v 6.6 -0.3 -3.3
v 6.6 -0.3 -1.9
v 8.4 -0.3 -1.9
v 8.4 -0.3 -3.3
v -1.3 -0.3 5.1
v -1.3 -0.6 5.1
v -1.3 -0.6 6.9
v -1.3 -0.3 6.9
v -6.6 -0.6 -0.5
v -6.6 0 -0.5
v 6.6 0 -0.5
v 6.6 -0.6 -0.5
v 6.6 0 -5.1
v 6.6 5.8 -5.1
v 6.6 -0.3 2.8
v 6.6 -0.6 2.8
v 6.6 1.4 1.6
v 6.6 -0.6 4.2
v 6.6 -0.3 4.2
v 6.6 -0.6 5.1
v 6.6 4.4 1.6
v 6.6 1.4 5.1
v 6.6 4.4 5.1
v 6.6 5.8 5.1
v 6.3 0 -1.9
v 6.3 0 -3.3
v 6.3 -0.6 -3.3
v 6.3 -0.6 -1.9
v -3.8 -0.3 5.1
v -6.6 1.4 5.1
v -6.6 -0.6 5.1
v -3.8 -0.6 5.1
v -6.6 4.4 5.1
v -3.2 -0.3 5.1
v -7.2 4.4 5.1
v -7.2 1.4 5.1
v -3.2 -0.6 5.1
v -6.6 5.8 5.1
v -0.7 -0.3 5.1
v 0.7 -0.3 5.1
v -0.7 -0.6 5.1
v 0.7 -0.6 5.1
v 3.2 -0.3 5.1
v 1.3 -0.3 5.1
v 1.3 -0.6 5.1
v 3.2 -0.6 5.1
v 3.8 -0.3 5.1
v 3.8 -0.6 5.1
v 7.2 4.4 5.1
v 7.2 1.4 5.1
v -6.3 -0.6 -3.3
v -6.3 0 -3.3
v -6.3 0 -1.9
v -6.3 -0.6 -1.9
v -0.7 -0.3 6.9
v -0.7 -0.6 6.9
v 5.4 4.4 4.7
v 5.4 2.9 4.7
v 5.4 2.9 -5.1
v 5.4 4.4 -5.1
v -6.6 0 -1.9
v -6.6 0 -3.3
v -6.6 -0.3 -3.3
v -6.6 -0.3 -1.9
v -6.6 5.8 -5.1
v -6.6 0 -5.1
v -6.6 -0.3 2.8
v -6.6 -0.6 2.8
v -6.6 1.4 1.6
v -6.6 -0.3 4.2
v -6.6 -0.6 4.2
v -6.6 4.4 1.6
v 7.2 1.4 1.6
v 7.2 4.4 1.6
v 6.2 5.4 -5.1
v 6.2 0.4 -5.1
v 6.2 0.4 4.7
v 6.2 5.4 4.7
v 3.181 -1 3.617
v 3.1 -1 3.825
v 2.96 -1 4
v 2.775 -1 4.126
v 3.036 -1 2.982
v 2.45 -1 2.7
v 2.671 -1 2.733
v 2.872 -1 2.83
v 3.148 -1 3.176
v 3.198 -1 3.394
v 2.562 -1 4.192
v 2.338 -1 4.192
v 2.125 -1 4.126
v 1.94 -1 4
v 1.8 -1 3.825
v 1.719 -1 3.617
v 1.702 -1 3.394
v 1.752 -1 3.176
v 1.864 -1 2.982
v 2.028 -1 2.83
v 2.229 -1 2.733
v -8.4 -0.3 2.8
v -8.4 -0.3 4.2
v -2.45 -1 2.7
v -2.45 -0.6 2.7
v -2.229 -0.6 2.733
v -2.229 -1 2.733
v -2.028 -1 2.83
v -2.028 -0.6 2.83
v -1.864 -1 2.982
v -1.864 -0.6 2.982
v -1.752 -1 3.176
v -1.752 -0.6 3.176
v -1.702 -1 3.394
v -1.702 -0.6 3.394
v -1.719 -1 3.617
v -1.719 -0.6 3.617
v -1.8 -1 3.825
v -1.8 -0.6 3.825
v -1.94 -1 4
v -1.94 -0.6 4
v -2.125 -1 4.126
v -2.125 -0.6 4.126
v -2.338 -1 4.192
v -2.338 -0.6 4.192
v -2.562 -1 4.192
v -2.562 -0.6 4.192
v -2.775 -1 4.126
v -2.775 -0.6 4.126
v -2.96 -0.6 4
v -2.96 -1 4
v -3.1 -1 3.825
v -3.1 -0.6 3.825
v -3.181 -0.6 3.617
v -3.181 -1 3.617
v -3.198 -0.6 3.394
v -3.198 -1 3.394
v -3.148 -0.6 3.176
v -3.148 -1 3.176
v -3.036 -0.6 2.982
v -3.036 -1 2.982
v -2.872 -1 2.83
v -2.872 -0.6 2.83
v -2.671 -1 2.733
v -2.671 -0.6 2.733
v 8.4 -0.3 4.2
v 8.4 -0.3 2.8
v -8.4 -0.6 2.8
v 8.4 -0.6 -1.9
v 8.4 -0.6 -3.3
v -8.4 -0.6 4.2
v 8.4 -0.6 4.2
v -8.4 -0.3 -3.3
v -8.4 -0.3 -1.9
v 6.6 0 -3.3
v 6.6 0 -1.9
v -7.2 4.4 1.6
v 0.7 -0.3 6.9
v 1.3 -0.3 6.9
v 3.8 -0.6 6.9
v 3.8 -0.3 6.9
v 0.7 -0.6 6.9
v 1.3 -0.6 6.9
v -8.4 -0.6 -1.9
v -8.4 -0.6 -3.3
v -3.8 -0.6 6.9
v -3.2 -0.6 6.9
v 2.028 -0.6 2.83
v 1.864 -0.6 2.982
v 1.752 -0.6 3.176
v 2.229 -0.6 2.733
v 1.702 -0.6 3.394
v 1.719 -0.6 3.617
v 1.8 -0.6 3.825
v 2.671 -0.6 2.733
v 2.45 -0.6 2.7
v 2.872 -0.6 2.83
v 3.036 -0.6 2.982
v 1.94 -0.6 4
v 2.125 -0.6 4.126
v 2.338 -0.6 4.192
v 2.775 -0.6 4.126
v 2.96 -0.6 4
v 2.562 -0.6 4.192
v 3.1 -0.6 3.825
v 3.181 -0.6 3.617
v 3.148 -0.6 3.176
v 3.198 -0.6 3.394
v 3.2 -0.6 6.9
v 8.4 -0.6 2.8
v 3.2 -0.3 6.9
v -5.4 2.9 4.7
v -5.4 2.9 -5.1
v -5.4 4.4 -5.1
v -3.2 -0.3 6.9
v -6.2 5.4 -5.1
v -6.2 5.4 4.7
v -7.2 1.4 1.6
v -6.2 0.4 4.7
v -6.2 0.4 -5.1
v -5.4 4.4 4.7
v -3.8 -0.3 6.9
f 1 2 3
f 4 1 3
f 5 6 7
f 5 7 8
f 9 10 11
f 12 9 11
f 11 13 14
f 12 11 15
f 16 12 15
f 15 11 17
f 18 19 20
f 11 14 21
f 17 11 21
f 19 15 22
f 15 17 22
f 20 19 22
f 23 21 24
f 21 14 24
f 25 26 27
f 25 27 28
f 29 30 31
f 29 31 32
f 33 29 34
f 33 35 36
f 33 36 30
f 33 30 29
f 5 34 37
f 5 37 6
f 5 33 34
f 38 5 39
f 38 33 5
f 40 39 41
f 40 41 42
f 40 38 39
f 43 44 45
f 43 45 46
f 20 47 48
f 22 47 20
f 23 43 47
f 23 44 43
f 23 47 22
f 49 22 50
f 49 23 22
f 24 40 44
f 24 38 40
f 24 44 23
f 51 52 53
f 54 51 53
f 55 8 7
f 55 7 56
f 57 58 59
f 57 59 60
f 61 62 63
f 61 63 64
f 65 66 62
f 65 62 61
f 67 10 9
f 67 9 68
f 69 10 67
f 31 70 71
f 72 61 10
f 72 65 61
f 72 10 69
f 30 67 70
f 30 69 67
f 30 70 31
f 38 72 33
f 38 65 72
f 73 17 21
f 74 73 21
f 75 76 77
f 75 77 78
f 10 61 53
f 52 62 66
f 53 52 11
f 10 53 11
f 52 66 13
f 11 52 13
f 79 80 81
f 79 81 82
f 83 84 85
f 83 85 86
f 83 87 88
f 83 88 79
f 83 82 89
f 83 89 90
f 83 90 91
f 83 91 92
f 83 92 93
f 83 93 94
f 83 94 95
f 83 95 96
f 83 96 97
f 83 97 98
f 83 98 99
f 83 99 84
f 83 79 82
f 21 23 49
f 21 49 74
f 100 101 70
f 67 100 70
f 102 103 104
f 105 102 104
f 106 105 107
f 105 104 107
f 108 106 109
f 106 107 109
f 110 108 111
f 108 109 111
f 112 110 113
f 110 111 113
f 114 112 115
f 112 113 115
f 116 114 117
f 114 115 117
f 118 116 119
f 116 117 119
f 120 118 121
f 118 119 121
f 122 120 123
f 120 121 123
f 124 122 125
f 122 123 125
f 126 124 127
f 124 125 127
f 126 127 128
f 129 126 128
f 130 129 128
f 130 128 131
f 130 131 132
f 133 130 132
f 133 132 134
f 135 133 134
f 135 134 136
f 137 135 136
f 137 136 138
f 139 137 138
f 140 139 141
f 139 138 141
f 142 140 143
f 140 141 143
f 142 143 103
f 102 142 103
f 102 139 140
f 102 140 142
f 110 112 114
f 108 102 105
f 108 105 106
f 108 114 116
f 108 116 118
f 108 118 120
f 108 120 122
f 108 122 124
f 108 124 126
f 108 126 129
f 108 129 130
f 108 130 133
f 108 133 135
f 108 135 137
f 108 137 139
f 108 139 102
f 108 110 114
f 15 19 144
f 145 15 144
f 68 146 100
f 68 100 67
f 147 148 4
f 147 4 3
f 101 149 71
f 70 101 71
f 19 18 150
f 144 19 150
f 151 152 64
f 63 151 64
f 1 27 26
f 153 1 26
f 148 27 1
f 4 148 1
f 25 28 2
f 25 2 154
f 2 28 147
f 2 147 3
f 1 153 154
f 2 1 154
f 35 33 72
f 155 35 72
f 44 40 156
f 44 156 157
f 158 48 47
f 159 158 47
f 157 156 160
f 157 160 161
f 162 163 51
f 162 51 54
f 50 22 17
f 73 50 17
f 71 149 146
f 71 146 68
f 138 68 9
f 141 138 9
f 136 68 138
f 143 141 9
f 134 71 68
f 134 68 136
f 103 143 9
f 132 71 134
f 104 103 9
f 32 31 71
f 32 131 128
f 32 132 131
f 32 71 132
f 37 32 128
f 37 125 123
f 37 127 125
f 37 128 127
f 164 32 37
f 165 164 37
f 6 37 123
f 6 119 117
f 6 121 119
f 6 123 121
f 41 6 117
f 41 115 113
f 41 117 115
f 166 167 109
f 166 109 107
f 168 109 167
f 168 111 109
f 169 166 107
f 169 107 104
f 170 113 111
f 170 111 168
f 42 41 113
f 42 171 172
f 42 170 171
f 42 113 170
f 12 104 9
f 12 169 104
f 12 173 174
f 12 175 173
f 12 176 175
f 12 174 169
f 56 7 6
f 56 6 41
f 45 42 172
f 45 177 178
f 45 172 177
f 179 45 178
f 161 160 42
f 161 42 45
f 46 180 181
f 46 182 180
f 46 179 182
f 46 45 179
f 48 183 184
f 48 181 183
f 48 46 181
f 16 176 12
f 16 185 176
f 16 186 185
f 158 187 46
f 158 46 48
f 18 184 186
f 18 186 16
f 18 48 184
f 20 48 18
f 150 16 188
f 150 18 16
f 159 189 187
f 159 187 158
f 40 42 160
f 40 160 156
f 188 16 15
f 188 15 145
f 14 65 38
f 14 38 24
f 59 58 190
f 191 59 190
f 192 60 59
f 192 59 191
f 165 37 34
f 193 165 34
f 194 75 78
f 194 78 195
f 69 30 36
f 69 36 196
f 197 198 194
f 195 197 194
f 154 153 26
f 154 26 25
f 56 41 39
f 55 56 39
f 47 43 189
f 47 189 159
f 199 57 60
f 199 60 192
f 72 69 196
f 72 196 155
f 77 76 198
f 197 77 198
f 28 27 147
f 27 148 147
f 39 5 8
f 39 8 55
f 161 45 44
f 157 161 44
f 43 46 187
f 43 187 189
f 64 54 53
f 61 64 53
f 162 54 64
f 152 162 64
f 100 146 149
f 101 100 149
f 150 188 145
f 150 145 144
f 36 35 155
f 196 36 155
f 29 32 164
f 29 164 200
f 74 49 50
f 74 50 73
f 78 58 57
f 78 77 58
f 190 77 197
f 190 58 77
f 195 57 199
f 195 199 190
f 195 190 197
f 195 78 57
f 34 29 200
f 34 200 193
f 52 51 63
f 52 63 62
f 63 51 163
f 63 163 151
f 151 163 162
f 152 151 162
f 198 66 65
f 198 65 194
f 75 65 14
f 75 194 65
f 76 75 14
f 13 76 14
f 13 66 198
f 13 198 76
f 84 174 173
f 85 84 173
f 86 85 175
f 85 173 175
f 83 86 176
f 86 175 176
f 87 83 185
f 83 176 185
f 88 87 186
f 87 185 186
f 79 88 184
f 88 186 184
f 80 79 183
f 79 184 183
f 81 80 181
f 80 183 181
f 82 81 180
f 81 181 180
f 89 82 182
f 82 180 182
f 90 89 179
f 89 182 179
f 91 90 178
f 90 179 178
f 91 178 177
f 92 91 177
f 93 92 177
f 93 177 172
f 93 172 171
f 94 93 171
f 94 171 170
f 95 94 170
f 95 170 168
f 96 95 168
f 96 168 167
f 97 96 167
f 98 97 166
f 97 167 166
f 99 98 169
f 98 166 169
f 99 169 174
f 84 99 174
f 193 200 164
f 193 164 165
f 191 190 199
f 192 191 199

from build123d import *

# Parameters (mm, degrees)
SKETCH_1_W          = 13.2
SKETCH_1_H          = 10.2
EXTRUDE_1_DEPTH     = 5.8
SKETCH_2_W          = 12.4
SKETCH_2_H          = 5
CUT_EXTRUDE_1_DEPTH = 9.8
SKETCH_3_W          = 10.8
SKETCH_3_H          = 1.5
EXTRUDE_2_DEPTH     = 9.8
SKETCH_4_W          = 3.5
SKETCH_4_H          = 3
EXTRUDE_3_DEPTH     = 0.6
EXTRUDE_START       = -13.2
SKETCH_4_2_W        = 3.5
SKETCH_4_2_H        = 3
EXTRUDE_4_DEPTH     = 0.6
SKETCH_5_W          = 13.2
SKETCH_5_H          = 5.6
EXTRUDE_5_DEPTH     = 0.6
SKETCH_6_R          = 0.75
EXTRUDE_6_DEPTH     = 0.4
SKETCH_7_W          = 1.8
SKETCH_7_H          = 1.4
EXTRUDE_7_DEPTH     = 0.3
SKETCH_8_W          = 1.4
SKETCH_8_H          = 0.6
EXTRUDE_9_DEPTH     = 0.3
EXTRUDE_START_2     = 13.2
SKETCH_8_2_W        = 1.4
SKETCH_8_2_H        = 0.6
EXTRUDE_10_DEPTH    = 0.3
SKETCH_9_W          = 0.6
SKETCH_9_H          = 0.3
EXTRUDE_11_DEPTH    = 1.8


with BuildPart() as part:
    # 草图1 → 凸台-拉伸1 (new body)
    with BuildSketch(Plane(origin=(0, 0, 0), x_dir=(1, 0, 0), z_dir=(0, 1, 0))):
        Rectangle(SKETCH_1_W, SKETCH_1_H)
    extrude(amount=EXTRUDE_1_DEPTH)

    # 草图2 → 切除-拉伸1 (cut)
    with BuildSketch(Plane(origin=(0, 0, -5.1), x_dir=(-1, 0, 0), z_dir=(0, 0, -1))):
        with Locations((0, 2.9)):
            Rectangle(SKETCH_2_W, SKETCH_2_H)
    extrude(amount=-CUT_EXTRUDE_1_DEPTH, mode=Mode.SUBTRACT)

    # 草图3 → 凸台-拉伸2 (add)
    with BuildSketch(Plane(origin=(0, 0, 4.7), x_dir=(-1, 0, 0), z_dir=(0, 0, -1))):
        with Locations((0, 3.65)):
            Rectangle(SKETCH_3_W, SKETCH_3_H)
    extrude(amount=EXTRUDE_2_DEPTH)

    # 草图4 → 凸台-拉伸3 (add)
    with BuildSketch(Plane(origin=(6.6, 0, 0), x_dir=(0, 0, -1), z_dir=(1, 0, 0))):
        with Locations((-3.35, 2.9)):
            Rectangle(SKETCH_4_W, SKETCH_4_H)
    extrude(amount=EXTRUDE_3_DEPTH)

    # 草图4<2> → 凸台-拉伸4 (add)
    with BuildSketch(Plane(origin=(6.6, 0, 0), x_dir=(0, 0, -1), z_dir=(1, 0, 0)).offset(EXTRUDE_START)):
        with Locations((-3.35, 2.9)):
            Rectangle(SKETCH_4_2_W, SKETCH_4_2_H)
    extrude(amount=-EXTRUDE_4_DEPTH)

    # 草图5 → 凸台-拉伸5 (add)
    with BuildSketch(Plane.XZ):
        with Locations((0, 2.3)):
            Rectangle(SKETCH_5_W, SKETCH_5_H)
    extrude(amount=EXTRUDE_5_DEPTH)

    # 草图6 → 凸台-拉伸6 (add)
    with BuildSketch(Plane.XZ.offset(0.6)):
        with Locations(Location((-2.45, 3.45, 0), (0, 0, 270))):
            Circle(SKETCH_6_R)
        with Locations(Location((2.45, 3.45, 0), (0, 0, 270))):
            Circle(SKETCH_6_R)
    extrude(amount=EXTRUDE_6_DEPTH)

    # 草图7 → 凸台-拉伸7 (add)
    with BuildSketch(Plane.XZ.offset(0.6)):
        with Locations((-7.5, 3.5)):
            Rectangle(SKETCH_7_W, SKETCH_7_H)
        with Locations((7.5, 3.5)):
            Rectangle(SKETCH_7_W, SKETCH_7_H)
        with Locations((-7.5, -2.6)):
            Rectangle(SKETCH_7_W, SKETCH_7_H)
        with Locations((7.5, -2.6)):
            Rectangle(SKETCH_7_W, SKETCH_7_H)
    extrude(amount=-EXTRUDE_7_DEPTH)


with BuildPart() as extrude_7_piece_1:
    # of the separate pieces the step leaves, piece 1, a body of its own (extrude_7_pieces)
    add(part.part.solids().sort_by_distance((-6.6, 1.4, 5.1))[0])



with BuildPart() as extrude_7_piece_2:
    # of the separate pieces the step leaves, piece 2, a body of its own (extrude_7_pieces)
    add(part.part.solids().sort_by_distance((6.6, -0.6, -1.9))[0])

    # 草图8 → 凸台-拉伸9 (add)
    with BuildSketch(Plane.ZY.offset(-6.6)):
        with Locations((-2.6, -0.3)):
            Rectangle(SKETCH_8_W, SKETCH_8_H)
    extrude(amount=EXTRUDE_9_DEPTH)


with BuildPart() as extrude_7_piece_3:
    # of the separate pieces the step leaves, piece 3, a body of its own (extrude_7_pieces)
    add(part.part.solids().sort_by_distance((-6.6, -0.6, -1.9))[0])


with BuildPart() as extrude_7_piece_1_1:
    add(extrude_7_piece_1.part)

    add(extrude_7_piece_3.part)  # 凸台-拉伸10 merges 凸台-拉伸7 piece 3
    # 草图8<2> → 凸台-拉伸10 (add)
    with BuildSketch(Plane.ZY.offset(-6.6).offset(EXTRUDE_START_2)):
        with Locations((-2.6, -0.3)):
            Rectangle(SKETCH_8_2_W, SKETCH_8_2_H)
    extrude(amount=-EXTRUDE_10_DEPTH)

    # 草图9 → 凸台-拉伸11 (add)
    with BuildSketch(Plane.XY.offset(5.1)):
        with Locations((-3.5, -0.45)):
            Rectangle(SKETCH_9_W, SKETCH_9_H)
        with Locations((-1, -0.45)):
            Rectangle(SKETCH_9_W, SKETCH_9_H)
        with Locations((1, -0.45)):
            Rectangle(SKETCH_9_W, SKETCH_9_H)
        with Locations((3.5, -0.45)):
            Rectangle(SKETCH_9_W, SKETCH_9_H)
    extrude(amount=EXTRUDE_11_DEPTH)


solid = Compound([extrude_7_piece_2.part, extrude_7_piece_1_1.part])
